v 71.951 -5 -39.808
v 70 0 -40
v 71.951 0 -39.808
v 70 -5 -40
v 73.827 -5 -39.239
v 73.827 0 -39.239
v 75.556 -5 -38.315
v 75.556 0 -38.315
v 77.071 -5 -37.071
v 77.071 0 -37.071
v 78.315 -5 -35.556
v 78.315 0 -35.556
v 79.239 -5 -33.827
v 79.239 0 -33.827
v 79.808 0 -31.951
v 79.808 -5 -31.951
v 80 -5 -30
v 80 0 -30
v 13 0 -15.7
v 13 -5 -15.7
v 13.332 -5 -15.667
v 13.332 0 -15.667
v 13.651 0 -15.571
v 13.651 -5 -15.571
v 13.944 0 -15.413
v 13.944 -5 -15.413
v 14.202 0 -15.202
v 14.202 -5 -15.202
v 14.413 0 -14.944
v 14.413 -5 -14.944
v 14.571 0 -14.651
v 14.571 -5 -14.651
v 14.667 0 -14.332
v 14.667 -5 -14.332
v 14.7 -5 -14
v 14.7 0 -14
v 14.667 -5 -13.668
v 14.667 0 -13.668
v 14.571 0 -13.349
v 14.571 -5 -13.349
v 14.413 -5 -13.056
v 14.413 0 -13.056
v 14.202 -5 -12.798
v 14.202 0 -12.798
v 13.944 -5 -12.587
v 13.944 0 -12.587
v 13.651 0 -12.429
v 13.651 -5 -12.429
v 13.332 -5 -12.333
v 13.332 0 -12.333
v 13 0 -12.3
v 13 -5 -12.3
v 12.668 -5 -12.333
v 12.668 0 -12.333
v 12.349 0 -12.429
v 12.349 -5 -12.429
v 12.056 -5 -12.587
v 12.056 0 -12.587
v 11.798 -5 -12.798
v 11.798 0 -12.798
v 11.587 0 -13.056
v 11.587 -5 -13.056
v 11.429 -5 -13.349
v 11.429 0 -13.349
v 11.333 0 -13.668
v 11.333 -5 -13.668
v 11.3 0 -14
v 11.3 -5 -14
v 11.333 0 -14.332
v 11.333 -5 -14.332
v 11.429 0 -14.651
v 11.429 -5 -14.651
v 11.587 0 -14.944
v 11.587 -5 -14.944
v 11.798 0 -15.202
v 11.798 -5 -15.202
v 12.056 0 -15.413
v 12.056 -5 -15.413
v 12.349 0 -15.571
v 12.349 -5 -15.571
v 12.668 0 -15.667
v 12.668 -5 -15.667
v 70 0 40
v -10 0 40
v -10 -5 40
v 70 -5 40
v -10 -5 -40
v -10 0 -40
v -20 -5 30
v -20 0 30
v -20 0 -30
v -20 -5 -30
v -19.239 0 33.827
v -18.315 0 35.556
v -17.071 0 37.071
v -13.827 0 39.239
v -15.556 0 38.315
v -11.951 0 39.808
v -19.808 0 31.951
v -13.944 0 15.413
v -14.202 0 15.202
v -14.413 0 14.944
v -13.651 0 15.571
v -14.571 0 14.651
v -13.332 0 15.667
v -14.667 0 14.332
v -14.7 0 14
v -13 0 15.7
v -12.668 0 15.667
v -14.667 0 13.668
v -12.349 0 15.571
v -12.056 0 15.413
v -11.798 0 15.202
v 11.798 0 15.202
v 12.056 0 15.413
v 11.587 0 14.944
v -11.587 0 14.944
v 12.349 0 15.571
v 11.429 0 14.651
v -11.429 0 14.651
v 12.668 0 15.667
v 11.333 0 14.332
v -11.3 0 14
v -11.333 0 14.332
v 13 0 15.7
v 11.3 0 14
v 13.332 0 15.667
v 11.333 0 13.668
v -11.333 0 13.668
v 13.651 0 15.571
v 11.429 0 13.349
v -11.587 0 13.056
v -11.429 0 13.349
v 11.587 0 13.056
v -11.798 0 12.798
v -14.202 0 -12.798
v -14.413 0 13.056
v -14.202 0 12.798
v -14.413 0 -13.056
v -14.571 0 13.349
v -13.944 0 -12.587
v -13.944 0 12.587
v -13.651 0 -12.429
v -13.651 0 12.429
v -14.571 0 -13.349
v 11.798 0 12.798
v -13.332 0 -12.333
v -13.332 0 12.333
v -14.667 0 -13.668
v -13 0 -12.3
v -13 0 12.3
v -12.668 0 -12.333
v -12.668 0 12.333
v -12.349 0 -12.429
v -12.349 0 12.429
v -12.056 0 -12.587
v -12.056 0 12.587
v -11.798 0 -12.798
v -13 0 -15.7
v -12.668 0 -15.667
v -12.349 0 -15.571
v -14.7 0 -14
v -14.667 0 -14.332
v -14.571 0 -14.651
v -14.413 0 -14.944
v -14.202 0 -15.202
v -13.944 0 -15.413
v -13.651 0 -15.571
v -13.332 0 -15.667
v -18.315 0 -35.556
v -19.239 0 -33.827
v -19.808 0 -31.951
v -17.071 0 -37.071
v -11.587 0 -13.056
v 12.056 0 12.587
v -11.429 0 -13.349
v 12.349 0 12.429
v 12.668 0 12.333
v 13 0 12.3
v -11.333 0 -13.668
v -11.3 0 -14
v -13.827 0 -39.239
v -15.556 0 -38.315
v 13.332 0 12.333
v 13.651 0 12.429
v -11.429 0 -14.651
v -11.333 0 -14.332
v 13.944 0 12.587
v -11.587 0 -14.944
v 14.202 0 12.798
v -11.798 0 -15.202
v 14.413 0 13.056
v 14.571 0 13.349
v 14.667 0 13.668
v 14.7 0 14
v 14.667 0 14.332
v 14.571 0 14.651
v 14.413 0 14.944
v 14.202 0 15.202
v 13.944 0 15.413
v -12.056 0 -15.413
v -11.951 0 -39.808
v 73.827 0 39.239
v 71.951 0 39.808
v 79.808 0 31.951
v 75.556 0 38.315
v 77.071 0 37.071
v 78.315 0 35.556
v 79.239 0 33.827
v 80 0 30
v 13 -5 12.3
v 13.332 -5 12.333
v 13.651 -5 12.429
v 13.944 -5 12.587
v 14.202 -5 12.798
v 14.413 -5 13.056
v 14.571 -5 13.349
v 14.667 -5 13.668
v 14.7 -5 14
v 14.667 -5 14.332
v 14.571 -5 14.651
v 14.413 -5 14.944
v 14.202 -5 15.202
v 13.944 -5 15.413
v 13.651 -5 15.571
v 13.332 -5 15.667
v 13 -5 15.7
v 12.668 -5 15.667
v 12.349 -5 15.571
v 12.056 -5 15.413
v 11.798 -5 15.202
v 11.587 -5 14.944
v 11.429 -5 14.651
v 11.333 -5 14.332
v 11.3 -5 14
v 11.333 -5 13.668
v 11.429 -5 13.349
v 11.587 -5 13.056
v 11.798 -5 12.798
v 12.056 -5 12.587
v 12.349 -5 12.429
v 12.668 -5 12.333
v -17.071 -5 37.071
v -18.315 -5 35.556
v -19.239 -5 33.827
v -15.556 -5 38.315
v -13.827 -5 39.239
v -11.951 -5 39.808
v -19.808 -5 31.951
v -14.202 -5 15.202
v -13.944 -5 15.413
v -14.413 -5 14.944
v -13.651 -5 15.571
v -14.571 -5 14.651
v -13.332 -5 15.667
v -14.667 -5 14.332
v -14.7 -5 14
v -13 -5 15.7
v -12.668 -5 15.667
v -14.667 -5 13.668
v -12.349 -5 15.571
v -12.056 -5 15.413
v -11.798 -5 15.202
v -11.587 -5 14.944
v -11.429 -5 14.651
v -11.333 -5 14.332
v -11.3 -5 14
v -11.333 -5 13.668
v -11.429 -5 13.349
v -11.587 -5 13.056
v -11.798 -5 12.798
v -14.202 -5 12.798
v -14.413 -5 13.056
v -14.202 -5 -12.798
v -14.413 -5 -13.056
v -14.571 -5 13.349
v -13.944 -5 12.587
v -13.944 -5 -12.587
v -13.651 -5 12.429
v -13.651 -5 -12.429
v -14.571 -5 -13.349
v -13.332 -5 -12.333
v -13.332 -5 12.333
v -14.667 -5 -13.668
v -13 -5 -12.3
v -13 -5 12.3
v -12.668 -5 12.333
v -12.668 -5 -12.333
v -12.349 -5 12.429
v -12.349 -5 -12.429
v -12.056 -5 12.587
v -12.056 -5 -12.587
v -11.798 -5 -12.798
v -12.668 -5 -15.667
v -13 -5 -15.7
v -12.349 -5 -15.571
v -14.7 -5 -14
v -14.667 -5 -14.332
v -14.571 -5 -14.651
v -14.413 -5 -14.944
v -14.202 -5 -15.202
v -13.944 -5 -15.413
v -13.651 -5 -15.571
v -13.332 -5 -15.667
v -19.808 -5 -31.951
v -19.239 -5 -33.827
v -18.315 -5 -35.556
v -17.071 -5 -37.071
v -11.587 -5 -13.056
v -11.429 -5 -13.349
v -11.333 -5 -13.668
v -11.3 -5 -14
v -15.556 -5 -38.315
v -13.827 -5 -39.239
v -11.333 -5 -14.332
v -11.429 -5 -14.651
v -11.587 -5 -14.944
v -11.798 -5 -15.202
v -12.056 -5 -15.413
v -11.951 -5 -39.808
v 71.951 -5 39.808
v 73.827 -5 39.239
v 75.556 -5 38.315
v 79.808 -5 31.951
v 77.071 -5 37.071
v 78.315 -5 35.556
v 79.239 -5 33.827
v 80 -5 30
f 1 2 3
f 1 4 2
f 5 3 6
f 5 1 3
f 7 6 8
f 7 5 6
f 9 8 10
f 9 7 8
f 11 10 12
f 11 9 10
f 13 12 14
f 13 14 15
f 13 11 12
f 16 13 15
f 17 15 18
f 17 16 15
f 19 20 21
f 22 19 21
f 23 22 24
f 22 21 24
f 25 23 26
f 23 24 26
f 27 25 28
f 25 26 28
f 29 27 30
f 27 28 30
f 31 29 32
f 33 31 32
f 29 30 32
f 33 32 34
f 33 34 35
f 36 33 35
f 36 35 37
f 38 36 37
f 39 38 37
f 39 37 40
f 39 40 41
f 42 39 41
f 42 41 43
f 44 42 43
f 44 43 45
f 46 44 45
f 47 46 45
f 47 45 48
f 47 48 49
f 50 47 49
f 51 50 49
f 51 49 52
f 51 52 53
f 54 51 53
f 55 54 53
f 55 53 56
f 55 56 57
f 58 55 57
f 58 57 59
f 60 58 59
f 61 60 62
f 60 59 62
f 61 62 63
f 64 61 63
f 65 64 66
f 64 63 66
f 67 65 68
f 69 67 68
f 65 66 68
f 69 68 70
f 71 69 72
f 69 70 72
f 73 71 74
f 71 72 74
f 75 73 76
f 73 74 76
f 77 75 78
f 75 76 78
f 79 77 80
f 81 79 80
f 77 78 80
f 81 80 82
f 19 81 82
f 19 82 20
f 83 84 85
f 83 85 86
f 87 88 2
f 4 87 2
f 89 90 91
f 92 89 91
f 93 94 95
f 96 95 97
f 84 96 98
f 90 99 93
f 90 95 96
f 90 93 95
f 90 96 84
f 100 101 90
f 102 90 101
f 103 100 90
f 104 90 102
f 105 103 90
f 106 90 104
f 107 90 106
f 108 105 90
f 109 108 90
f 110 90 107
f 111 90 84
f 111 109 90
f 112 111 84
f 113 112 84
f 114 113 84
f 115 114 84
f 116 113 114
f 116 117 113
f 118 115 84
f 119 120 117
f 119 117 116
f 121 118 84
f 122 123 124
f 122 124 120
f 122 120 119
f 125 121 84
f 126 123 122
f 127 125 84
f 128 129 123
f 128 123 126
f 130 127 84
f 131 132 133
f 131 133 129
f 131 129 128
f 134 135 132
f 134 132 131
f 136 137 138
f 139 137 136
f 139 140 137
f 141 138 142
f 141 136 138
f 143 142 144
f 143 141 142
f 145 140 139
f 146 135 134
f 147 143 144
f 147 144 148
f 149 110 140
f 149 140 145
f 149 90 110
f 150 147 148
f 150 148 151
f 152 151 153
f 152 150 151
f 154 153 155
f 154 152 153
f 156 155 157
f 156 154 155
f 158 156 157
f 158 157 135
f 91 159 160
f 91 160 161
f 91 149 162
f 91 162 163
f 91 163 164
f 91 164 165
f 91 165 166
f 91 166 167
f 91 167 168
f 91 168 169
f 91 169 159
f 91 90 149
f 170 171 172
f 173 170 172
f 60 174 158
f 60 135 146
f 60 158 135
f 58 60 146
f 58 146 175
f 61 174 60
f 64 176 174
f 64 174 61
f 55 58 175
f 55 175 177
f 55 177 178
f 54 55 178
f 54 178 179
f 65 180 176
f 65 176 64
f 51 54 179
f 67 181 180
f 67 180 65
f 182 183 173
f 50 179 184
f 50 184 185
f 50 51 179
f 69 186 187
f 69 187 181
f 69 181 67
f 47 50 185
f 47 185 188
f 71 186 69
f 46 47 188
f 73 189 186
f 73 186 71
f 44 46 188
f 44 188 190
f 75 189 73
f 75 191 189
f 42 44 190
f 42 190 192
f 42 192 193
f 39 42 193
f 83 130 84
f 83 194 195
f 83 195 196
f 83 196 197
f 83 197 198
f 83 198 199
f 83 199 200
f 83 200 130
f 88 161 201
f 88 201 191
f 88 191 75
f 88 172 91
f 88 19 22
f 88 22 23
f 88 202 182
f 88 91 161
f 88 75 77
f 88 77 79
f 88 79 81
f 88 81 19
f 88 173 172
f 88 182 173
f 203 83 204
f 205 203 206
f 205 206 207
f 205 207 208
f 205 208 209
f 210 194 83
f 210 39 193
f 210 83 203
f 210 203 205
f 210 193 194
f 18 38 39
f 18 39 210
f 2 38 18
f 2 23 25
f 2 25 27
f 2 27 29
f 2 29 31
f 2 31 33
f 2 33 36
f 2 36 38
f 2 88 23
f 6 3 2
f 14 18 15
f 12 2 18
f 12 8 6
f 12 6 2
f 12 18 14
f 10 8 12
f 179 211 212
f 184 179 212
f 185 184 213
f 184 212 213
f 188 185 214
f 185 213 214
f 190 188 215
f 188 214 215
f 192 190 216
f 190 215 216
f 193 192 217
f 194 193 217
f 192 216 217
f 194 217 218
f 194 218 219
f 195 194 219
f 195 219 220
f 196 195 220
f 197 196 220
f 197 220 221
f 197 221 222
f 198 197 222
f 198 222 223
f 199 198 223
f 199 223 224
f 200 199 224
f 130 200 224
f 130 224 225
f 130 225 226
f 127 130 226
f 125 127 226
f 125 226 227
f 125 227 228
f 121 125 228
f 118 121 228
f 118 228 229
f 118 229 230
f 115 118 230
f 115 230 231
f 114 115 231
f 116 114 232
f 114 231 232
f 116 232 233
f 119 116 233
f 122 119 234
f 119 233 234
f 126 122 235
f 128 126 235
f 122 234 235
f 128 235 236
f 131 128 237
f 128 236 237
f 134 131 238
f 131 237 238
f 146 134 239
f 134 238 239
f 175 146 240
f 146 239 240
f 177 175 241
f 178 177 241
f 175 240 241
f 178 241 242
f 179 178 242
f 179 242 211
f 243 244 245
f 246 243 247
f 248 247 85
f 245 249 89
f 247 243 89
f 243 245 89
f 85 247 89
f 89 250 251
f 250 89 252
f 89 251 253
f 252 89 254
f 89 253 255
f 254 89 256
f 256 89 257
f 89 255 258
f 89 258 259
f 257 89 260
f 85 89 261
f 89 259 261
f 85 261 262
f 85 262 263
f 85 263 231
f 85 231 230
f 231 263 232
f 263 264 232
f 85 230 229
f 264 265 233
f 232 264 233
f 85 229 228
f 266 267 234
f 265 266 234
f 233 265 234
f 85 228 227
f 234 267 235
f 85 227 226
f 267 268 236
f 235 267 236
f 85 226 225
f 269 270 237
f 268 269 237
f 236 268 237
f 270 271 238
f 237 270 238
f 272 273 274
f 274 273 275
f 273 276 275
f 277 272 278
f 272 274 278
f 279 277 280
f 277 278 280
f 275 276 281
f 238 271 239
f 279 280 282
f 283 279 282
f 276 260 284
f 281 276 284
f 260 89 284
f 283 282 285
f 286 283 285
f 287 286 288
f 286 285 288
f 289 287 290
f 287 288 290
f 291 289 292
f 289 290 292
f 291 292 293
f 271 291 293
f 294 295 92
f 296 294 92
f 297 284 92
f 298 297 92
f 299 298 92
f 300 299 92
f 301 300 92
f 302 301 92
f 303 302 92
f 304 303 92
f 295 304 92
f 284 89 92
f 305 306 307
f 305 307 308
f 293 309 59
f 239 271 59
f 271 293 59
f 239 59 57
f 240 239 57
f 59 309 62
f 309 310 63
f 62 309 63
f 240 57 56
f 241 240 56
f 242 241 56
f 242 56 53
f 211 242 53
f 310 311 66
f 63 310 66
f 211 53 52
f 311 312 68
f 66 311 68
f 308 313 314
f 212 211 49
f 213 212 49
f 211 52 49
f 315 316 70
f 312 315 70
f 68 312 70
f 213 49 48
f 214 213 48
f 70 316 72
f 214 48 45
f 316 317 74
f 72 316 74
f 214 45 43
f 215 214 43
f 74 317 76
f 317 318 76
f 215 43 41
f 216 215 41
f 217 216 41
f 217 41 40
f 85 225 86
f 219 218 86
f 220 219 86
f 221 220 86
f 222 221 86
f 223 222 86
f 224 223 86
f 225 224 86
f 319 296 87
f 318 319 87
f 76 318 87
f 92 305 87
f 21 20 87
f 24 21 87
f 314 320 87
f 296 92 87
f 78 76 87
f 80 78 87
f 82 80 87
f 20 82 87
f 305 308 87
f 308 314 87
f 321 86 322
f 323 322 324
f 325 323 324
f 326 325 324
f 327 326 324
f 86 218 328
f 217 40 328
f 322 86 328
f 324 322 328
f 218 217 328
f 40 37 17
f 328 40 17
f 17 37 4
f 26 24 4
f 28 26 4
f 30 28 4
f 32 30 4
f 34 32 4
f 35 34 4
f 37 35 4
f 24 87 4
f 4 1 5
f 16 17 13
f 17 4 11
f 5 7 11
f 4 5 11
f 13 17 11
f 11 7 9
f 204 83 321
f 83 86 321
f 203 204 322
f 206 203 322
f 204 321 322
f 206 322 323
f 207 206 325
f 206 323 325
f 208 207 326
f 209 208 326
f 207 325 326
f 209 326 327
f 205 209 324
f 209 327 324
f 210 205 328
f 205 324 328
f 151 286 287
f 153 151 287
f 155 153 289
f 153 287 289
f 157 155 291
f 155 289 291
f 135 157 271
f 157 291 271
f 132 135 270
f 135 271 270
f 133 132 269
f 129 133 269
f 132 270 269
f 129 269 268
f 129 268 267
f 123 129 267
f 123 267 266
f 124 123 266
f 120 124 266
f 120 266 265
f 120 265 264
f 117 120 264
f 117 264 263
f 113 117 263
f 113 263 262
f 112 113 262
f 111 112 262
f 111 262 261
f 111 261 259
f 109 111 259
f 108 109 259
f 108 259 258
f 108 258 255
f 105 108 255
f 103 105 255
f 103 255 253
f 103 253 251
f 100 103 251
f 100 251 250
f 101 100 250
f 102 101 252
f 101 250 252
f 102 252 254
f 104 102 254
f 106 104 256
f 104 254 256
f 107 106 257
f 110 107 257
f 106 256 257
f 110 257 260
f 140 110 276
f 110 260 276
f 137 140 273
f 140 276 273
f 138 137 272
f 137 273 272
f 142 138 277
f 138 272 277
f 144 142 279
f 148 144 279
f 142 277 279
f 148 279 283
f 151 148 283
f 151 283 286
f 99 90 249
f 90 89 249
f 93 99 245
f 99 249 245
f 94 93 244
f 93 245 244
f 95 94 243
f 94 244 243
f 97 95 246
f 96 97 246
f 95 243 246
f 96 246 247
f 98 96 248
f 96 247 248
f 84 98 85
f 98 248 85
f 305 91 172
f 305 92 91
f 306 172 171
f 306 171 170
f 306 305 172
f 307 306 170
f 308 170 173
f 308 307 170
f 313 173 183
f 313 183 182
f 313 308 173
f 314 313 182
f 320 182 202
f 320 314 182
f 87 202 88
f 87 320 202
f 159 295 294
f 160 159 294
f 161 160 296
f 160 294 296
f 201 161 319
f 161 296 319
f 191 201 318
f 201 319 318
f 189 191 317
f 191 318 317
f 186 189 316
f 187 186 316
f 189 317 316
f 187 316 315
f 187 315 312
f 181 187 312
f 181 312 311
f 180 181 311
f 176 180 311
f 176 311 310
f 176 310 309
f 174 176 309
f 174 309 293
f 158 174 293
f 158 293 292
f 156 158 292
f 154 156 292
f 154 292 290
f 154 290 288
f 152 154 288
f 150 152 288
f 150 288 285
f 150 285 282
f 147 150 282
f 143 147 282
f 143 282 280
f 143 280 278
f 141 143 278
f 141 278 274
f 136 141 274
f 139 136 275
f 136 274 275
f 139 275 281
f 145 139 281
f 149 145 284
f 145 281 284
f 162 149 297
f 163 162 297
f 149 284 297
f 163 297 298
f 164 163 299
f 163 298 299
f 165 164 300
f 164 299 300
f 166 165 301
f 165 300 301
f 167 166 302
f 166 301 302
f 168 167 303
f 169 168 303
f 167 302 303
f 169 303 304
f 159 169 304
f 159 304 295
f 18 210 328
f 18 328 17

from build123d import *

# Parameters (mm, degrees)
SKETCH1_W            = 100
SKETCH1_H            = 80
BOSS_EXTRUDE1_DEPTH  = 5
M3_CLEARANCE_HOLE1_D = 3.4
FILLET1_R            = 10


with BuildPart() as part:
    # Sketch1 → Boss-Extrude1 (new body)
    with BuildSketch(Plane(origin=(0, 0, 0), x_dir=(1, 0, 0), z_dir=(0, 1, 0))):
        with Locations((30, 0)):
            Rectangle(SKETCH1_W, SKETCH1_H)
    extrude(amount=-BOSS_EXTRUDE1_DEPTH)

    # M3 Clearance Hole1 (through all)
    with Locations(Plane(origin=(-13, 0, -14), x_dir=(0, 0, 1), z_dir=(0, 1, 0))):
        with Locations((0, 0), (0, 26), (28, 26), (28, 0)):
            Hole(M3_CLEARANCE_HOLE1_D / 2)

    # Fillet1
    fillet1_edges = [part.edges().sort_by_distance(p)[0] for p in [
        (-20, -2.5, -40),
        (80, -2.5, -40),
        (80, -2.5, 40),
        (-20, -2.5, 40),
    ]]
    fillet(fillet1_edges, radius=FILLET1_R)


solid = part.part
